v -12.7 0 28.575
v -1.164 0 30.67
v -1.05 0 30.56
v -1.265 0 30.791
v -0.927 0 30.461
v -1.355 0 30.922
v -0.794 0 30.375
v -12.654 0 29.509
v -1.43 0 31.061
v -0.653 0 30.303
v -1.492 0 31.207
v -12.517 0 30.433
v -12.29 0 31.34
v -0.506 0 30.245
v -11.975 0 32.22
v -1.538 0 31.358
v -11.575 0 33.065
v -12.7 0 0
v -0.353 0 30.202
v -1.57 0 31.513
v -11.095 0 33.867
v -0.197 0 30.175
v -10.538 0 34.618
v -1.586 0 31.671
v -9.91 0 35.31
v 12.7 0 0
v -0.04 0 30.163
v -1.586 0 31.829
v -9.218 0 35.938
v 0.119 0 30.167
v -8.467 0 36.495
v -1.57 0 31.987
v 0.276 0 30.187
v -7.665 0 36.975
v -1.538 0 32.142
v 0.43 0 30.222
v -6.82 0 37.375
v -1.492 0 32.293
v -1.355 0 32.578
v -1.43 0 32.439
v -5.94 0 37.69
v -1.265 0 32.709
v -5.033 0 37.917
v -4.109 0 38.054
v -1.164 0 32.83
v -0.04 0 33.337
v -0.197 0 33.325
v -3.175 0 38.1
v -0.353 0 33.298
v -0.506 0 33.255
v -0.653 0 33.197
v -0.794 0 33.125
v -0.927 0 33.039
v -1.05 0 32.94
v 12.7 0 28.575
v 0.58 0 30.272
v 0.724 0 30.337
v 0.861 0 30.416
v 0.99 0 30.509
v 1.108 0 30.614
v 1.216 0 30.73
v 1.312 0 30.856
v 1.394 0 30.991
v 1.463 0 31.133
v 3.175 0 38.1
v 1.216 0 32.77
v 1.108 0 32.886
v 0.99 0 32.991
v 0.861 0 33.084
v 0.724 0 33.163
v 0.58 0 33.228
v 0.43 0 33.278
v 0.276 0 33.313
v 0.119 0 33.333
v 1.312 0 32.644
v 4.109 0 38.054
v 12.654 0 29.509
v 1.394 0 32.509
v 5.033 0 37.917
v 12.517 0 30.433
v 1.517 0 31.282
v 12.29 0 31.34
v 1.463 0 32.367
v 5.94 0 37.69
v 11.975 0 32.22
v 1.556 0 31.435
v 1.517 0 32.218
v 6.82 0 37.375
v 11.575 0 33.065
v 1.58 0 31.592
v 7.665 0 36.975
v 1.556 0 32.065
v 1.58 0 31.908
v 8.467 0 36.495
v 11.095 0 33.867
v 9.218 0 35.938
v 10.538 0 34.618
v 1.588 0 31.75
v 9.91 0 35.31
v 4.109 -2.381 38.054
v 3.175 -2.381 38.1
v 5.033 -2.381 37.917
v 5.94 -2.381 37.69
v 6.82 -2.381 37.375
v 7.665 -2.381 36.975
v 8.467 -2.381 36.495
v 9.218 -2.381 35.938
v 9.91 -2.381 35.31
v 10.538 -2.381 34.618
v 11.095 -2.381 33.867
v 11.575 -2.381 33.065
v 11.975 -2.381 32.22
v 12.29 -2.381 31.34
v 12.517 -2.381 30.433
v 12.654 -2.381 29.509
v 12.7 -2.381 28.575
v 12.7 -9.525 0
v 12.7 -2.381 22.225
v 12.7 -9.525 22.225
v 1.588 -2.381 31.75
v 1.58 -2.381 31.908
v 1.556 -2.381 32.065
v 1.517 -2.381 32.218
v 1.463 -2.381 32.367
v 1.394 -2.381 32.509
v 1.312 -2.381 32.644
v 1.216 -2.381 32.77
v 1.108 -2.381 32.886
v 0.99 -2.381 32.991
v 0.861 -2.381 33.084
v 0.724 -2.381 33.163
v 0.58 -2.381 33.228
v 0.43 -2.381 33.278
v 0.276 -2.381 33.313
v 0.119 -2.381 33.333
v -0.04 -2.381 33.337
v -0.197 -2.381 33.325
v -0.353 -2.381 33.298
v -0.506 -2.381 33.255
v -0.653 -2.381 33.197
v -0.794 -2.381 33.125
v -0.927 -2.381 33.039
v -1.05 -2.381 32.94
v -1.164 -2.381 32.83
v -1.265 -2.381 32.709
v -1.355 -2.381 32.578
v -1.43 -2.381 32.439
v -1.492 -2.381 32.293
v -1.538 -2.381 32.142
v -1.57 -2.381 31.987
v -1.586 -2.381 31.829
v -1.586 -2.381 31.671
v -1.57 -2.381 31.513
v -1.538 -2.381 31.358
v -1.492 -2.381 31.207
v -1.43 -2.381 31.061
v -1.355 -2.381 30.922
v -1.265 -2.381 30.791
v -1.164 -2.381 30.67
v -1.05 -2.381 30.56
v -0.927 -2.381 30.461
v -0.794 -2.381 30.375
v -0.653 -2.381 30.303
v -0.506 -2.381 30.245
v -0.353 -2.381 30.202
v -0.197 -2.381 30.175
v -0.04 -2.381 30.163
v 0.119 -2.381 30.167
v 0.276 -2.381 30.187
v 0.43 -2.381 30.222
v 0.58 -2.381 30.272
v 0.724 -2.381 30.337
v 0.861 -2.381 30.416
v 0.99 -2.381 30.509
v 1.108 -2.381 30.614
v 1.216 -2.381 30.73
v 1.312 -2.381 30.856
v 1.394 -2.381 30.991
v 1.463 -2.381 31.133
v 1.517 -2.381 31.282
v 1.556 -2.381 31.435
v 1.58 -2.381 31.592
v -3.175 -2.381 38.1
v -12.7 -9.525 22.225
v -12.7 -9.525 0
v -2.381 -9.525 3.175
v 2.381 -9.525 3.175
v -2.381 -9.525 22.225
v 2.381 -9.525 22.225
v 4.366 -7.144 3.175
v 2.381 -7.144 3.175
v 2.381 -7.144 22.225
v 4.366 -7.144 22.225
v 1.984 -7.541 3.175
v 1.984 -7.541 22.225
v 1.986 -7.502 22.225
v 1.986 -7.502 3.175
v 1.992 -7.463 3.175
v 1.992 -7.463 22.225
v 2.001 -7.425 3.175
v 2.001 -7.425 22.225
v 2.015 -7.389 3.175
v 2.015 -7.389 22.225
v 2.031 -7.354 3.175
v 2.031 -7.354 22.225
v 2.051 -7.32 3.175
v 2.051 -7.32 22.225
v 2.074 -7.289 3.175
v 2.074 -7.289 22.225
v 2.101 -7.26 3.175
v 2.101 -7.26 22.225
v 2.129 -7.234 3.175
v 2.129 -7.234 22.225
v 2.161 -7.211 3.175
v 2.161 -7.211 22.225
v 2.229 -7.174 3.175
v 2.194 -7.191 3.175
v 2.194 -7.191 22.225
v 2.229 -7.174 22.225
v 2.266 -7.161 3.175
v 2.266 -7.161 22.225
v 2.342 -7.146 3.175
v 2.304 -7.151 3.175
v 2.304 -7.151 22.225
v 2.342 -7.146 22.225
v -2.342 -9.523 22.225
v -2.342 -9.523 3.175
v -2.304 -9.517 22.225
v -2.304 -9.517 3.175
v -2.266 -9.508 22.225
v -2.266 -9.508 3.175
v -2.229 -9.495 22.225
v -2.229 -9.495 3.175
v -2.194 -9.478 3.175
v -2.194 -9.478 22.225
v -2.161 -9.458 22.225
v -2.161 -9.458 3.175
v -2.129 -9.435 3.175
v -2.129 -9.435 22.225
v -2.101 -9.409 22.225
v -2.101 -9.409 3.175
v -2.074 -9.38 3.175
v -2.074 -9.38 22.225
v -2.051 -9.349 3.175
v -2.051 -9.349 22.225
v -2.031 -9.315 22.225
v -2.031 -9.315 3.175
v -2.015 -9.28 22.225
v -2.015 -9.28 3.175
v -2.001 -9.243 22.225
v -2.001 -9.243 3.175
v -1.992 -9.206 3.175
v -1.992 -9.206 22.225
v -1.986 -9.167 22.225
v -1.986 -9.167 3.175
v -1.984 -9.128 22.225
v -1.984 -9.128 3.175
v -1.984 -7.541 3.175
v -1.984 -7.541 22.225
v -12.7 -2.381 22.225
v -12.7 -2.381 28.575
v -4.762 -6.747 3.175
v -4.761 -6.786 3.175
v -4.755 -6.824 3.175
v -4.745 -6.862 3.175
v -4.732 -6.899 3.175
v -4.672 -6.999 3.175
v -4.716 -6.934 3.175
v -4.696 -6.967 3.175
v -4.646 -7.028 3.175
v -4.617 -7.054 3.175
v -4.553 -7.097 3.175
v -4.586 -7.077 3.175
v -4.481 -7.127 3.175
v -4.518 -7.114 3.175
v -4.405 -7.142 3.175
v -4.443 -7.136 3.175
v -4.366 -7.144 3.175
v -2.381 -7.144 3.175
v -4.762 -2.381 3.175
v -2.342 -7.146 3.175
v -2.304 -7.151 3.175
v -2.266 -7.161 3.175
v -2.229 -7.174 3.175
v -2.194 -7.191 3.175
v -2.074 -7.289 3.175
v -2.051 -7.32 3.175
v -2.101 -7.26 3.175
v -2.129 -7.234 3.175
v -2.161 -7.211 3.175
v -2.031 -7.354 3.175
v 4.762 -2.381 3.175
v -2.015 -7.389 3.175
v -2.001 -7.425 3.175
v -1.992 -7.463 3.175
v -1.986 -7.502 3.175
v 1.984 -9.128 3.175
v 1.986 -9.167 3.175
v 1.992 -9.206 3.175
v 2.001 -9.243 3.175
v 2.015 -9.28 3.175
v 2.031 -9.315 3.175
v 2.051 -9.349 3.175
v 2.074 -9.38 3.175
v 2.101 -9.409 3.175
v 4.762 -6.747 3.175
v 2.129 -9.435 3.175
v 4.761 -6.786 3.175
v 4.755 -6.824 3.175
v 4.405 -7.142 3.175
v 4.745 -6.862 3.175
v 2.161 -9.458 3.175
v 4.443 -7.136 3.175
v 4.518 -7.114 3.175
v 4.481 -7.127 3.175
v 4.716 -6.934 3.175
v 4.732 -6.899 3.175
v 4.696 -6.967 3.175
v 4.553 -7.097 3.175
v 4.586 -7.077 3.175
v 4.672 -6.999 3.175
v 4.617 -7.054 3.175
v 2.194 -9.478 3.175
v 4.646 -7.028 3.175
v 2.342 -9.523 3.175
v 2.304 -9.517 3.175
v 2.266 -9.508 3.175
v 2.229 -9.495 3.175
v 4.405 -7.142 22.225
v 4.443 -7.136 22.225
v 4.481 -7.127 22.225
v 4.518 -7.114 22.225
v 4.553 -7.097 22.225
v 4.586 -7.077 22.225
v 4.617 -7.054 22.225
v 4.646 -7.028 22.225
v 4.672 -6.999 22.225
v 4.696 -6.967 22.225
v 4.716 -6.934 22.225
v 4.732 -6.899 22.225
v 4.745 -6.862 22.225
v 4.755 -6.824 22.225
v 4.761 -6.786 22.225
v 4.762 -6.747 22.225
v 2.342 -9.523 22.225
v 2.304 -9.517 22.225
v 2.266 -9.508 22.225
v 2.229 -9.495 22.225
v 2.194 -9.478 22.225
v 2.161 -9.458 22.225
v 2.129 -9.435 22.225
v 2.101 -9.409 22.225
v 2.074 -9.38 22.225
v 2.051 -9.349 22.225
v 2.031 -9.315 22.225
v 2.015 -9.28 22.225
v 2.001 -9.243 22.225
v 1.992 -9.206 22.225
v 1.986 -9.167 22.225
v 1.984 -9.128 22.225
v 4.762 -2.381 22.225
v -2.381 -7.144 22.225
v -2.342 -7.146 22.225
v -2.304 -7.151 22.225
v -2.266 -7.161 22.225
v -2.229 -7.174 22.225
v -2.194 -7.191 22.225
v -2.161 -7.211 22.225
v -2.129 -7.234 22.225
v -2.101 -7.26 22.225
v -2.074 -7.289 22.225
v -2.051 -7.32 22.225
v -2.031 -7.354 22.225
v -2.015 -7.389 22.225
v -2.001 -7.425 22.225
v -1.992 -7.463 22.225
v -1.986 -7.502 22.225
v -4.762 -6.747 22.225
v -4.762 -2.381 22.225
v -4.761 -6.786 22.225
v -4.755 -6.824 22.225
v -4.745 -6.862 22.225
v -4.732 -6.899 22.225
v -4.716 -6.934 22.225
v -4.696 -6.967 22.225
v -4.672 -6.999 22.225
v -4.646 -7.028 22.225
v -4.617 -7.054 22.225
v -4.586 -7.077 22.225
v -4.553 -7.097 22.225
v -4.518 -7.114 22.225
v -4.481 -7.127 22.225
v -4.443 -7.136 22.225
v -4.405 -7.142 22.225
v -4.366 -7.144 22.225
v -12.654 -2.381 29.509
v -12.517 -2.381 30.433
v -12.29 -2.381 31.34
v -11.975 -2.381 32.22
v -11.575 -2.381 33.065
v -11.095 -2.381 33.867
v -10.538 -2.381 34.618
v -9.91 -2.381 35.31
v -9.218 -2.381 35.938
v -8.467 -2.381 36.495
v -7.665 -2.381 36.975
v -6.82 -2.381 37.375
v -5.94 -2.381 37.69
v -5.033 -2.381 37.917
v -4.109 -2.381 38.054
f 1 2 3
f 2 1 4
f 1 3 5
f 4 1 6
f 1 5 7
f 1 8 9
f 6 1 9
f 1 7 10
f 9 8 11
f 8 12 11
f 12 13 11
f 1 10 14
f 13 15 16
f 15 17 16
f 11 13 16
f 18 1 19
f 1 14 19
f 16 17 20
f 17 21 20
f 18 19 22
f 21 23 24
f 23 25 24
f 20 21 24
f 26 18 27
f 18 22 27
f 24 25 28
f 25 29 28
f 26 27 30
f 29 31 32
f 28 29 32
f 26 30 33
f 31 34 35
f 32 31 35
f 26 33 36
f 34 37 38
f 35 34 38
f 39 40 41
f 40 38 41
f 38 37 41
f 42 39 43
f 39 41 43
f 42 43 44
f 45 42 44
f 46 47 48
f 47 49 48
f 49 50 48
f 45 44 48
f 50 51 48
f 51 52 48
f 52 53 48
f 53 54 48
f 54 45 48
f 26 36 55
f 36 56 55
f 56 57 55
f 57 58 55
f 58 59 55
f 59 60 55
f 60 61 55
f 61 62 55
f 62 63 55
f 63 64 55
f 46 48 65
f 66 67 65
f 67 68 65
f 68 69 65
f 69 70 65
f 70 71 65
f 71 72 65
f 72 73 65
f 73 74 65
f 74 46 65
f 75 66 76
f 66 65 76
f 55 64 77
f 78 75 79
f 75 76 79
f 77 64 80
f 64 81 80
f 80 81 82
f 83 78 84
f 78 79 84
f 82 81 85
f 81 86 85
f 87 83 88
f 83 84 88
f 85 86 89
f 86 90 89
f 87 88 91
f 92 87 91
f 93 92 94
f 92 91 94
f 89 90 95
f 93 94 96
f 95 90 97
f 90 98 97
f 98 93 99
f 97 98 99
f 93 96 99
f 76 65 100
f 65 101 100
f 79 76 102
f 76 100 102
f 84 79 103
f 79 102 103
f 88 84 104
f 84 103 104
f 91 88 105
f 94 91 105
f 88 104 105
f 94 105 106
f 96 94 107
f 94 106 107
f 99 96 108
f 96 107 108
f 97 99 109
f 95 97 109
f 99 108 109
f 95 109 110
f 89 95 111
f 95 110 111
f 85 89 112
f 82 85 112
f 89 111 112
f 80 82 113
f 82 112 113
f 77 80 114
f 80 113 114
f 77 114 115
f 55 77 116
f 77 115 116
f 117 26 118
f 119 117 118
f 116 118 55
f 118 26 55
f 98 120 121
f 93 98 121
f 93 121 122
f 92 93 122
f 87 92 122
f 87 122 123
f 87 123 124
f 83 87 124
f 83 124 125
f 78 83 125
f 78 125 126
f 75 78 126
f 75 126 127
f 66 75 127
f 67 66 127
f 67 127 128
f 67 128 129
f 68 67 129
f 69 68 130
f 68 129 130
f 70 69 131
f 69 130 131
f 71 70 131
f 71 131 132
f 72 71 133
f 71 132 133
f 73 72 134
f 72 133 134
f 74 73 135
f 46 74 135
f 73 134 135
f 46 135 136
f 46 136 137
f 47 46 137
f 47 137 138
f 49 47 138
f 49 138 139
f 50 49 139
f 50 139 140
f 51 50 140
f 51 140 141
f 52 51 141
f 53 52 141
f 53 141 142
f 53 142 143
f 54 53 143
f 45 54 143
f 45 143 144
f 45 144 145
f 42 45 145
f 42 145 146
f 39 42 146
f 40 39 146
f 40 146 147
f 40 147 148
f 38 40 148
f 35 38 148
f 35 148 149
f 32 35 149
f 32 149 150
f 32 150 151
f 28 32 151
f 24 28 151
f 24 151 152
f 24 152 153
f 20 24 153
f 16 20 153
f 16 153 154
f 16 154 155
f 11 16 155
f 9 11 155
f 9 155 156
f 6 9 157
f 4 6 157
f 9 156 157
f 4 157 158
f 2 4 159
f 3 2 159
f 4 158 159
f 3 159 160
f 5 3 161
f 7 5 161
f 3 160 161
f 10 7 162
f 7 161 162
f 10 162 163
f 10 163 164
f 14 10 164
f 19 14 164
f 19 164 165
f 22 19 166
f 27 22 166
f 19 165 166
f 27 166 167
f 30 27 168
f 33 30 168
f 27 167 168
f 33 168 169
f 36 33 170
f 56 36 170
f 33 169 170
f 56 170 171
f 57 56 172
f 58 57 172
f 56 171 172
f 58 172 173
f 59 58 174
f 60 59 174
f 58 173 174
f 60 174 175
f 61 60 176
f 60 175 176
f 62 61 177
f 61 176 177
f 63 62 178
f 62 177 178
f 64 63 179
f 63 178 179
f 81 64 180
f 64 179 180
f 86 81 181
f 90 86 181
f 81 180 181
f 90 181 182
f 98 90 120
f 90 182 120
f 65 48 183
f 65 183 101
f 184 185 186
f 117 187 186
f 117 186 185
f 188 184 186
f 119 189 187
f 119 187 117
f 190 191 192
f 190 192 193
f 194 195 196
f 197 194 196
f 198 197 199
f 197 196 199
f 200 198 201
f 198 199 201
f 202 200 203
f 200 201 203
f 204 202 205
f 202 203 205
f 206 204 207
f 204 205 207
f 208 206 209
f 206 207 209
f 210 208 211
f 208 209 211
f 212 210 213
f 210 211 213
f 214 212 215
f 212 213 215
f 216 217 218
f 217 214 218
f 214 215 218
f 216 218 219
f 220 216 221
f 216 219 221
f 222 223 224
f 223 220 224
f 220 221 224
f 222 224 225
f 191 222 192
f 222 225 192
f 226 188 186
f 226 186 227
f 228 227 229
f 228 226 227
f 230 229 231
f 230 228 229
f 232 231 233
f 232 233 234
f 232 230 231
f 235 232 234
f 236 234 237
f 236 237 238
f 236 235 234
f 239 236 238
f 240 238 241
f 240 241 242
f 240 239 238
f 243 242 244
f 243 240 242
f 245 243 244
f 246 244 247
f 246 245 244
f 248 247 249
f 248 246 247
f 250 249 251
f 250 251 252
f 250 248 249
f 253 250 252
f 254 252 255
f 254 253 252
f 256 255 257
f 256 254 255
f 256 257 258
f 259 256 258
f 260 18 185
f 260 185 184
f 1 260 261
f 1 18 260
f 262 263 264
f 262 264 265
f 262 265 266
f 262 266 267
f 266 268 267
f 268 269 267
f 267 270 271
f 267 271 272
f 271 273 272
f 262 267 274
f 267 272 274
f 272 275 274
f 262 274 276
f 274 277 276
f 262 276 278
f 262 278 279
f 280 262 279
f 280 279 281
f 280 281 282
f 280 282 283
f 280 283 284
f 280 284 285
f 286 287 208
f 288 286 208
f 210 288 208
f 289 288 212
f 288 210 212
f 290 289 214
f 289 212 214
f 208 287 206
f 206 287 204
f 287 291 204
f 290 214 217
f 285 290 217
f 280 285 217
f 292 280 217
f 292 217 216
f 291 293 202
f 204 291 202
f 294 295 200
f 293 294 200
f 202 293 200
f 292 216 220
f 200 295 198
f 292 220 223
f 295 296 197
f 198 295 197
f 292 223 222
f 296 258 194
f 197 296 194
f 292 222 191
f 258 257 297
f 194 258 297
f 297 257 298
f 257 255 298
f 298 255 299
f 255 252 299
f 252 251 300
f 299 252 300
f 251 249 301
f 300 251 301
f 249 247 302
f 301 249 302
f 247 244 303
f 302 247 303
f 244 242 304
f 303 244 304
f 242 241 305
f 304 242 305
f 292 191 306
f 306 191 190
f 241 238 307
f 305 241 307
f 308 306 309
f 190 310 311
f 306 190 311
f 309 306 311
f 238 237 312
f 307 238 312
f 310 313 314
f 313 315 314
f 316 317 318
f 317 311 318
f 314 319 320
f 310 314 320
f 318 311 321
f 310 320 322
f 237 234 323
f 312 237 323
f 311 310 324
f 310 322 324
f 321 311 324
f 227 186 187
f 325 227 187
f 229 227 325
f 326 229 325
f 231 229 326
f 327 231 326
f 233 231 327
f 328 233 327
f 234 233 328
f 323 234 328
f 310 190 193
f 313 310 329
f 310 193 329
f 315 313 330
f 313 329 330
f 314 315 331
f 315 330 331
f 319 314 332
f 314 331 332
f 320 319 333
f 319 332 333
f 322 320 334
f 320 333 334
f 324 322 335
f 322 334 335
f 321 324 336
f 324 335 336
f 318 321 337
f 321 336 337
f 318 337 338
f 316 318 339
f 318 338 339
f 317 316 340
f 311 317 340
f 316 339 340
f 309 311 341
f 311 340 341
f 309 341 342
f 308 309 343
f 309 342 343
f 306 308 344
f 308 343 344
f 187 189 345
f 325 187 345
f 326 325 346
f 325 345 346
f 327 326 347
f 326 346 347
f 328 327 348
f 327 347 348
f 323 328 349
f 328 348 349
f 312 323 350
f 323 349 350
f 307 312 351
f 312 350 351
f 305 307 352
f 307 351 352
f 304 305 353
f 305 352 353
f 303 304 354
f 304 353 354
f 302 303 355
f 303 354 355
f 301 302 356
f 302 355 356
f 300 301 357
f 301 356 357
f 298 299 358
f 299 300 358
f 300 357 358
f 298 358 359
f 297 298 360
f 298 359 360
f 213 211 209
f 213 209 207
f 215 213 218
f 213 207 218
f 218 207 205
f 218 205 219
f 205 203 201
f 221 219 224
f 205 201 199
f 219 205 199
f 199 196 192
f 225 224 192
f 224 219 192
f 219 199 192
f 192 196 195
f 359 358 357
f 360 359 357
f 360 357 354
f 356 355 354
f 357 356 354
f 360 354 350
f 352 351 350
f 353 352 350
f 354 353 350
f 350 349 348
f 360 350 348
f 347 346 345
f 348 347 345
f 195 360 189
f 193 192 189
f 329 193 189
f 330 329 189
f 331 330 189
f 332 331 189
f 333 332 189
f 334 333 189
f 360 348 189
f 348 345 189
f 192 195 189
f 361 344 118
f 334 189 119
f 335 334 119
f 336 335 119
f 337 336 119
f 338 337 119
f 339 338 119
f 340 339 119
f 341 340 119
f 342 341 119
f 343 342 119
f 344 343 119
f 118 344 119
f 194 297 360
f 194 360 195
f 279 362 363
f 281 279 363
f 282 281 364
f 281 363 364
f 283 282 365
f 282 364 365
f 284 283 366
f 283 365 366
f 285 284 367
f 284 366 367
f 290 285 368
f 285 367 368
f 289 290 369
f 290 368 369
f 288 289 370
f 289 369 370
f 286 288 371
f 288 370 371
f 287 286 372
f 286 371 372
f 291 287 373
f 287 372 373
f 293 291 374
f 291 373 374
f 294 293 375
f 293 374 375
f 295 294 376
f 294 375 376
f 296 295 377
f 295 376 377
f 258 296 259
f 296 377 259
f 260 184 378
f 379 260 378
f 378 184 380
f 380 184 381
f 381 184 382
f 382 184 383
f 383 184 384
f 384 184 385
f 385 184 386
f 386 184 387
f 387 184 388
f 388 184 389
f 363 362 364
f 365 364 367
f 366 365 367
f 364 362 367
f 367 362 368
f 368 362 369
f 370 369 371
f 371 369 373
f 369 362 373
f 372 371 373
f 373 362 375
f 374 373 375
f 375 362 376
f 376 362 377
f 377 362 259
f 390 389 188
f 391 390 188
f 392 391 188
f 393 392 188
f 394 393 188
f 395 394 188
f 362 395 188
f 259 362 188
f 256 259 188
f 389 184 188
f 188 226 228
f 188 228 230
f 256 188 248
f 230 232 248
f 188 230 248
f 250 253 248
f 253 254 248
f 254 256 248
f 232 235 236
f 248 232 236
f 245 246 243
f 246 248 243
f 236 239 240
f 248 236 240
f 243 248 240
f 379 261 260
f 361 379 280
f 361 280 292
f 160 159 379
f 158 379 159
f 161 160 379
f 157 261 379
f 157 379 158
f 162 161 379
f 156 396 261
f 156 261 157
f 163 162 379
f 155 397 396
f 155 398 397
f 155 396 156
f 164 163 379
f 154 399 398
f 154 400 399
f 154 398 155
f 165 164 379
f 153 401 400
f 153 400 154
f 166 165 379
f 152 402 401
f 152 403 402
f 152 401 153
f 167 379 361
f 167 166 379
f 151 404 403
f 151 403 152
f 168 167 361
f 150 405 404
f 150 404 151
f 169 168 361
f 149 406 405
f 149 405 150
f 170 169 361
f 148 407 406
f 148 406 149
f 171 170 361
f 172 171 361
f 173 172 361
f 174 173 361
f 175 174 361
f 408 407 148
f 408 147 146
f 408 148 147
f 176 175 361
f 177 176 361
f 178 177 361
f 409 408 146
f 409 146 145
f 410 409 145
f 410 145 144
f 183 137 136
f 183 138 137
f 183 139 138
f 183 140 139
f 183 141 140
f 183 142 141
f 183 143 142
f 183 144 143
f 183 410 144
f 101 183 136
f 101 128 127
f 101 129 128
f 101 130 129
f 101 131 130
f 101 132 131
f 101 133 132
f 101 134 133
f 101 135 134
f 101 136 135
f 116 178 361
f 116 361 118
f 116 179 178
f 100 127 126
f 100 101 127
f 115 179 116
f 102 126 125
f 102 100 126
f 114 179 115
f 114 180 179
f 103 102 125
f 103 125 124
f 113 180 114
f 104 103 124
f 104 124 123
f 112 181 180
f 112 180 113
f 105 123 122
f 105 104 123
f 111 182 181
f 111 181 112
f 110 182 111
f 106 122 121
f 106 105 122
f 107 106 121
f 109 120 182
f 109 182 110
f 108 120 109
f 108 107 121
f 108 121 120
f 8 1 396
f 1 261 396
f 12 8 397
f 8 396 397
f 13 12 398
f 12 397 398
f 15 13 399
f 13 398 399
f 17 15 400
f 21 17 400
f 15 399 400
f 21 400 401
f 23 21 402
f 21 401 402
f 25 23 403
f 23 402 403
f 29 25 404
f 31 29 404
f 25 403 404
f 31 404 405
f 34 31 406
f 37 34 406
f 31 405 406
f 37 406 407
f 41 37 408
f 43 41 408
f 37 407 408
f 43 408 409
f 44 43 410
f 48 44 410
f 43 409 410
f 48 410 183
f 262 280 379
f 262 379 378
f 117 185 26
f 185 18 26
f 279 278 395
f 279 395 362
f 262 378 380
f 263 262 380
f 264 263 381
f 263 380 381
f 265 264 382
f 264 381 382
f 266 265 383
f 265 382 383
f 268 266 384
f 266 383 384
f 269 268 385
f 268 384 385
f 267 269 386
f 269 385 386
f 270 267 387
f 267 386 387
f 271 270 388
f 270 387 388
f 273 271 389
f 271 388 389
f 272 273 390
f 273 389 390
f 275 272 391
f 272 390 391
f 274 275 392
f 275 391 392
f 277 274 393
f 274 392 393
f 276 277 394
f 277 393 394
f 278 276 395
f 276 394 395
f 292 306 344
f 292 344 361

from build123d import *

# Parameters (mm, degrees)
F0_W      = 25.4
F0_H      = 38.1
F1_DEPTH  = 9.525
F2_W      = 3.96875
F2_H      = 2.38125
F3_DEPTH  = 22.225
F4_W      = 25.4
F4_H      = 15.875
F5_DEPTH  = 7.14375
F6_R      = 9.525
F7_R      = 0.396875
F8_W      = 25.4
F8_H      = 9.525
F9_DEPTH  = 3.175
F10_R     = 1.5875
F11_DEPTH = 2.38225


with BuildPart() as f1:
    # F0 (on Front) → F1 (new body)
    with BuildSketch(Plane.XZ):
        with Locations((0, 19.05)):
            Rectangle(F0_W, F0_H)
    extrude(amount=F1_DEPTH)

    # F2 (on Top) → F3 (cut)
    with BuildSketch(Plane.XY):
        Polygon((4.7625, -2.38125), (-4.7625, -2.38125), (-4.7625, -7.14375), (-1.984375, -7.14375), (1.984375, -7.14375), (4.7625, -7.14375), align=None)
        with Locations((0, -8.334375)):
            Rectangle(F2_W, F2_H)
    extrude(amount=F3_DEPTH, mode=Mode.SUBTRACT)

    # F4 (on face) → F5 (cut)
    with BuildSketch(Plane.XZ.offset(9.525)):
        with Locations((0, 30.1625)):
            Rectangle(F4_W, F4_H)
    extrude(amount=-F5_DEPTH, mode=Mode.SUBTRACT)

    # F6
    f6_edges = [f1.edges().sort_by_distance(p)[0] for p in [
        (12.7, -1.190625, 38.1),
        (-12.7, -1.190625, 38.1),
    ]]
    fillet(f6_edges, radius=F6_R)

    # F7
    f7_edges = [f1.edges().sort_by_distance(p)[0] for p in [
        (-4.7625, -7.14375, 11.1125),
        (4.7625, -7.14375, 11.1125),
        (1.984375, -7.14375, 11.1125),
        (1.984375, -9.525, 11.1125),
        (-1.984375, -7.14375, 11.1125),
        (-1.984375, -9.525, 11.1125),
    ]]
    fillet(f7_edges, radius=F7_R)

    # F8 (on face) → F9 (join)
    with BuildSketch(Plane(origin=(0, 0, 0), x_dir=(1, 0, 0), z_dir=(0, 0, -1))):
        with Locations((0, 4.7625)):
            Rectangle(F8_W, F8_H)
    extrude(amount=-F9_DEPTH)

    # F10 (on face) → F11 (cut, through all)
    with BuildSketch(Plane.XZ.offset(2.38125)):
        with Locations((0, 31.75)):
            Circle(F10_R)
    extrude(amount=-F11_DEPTH, mode=Mode.SUBTRACT)


solid = f1.part
